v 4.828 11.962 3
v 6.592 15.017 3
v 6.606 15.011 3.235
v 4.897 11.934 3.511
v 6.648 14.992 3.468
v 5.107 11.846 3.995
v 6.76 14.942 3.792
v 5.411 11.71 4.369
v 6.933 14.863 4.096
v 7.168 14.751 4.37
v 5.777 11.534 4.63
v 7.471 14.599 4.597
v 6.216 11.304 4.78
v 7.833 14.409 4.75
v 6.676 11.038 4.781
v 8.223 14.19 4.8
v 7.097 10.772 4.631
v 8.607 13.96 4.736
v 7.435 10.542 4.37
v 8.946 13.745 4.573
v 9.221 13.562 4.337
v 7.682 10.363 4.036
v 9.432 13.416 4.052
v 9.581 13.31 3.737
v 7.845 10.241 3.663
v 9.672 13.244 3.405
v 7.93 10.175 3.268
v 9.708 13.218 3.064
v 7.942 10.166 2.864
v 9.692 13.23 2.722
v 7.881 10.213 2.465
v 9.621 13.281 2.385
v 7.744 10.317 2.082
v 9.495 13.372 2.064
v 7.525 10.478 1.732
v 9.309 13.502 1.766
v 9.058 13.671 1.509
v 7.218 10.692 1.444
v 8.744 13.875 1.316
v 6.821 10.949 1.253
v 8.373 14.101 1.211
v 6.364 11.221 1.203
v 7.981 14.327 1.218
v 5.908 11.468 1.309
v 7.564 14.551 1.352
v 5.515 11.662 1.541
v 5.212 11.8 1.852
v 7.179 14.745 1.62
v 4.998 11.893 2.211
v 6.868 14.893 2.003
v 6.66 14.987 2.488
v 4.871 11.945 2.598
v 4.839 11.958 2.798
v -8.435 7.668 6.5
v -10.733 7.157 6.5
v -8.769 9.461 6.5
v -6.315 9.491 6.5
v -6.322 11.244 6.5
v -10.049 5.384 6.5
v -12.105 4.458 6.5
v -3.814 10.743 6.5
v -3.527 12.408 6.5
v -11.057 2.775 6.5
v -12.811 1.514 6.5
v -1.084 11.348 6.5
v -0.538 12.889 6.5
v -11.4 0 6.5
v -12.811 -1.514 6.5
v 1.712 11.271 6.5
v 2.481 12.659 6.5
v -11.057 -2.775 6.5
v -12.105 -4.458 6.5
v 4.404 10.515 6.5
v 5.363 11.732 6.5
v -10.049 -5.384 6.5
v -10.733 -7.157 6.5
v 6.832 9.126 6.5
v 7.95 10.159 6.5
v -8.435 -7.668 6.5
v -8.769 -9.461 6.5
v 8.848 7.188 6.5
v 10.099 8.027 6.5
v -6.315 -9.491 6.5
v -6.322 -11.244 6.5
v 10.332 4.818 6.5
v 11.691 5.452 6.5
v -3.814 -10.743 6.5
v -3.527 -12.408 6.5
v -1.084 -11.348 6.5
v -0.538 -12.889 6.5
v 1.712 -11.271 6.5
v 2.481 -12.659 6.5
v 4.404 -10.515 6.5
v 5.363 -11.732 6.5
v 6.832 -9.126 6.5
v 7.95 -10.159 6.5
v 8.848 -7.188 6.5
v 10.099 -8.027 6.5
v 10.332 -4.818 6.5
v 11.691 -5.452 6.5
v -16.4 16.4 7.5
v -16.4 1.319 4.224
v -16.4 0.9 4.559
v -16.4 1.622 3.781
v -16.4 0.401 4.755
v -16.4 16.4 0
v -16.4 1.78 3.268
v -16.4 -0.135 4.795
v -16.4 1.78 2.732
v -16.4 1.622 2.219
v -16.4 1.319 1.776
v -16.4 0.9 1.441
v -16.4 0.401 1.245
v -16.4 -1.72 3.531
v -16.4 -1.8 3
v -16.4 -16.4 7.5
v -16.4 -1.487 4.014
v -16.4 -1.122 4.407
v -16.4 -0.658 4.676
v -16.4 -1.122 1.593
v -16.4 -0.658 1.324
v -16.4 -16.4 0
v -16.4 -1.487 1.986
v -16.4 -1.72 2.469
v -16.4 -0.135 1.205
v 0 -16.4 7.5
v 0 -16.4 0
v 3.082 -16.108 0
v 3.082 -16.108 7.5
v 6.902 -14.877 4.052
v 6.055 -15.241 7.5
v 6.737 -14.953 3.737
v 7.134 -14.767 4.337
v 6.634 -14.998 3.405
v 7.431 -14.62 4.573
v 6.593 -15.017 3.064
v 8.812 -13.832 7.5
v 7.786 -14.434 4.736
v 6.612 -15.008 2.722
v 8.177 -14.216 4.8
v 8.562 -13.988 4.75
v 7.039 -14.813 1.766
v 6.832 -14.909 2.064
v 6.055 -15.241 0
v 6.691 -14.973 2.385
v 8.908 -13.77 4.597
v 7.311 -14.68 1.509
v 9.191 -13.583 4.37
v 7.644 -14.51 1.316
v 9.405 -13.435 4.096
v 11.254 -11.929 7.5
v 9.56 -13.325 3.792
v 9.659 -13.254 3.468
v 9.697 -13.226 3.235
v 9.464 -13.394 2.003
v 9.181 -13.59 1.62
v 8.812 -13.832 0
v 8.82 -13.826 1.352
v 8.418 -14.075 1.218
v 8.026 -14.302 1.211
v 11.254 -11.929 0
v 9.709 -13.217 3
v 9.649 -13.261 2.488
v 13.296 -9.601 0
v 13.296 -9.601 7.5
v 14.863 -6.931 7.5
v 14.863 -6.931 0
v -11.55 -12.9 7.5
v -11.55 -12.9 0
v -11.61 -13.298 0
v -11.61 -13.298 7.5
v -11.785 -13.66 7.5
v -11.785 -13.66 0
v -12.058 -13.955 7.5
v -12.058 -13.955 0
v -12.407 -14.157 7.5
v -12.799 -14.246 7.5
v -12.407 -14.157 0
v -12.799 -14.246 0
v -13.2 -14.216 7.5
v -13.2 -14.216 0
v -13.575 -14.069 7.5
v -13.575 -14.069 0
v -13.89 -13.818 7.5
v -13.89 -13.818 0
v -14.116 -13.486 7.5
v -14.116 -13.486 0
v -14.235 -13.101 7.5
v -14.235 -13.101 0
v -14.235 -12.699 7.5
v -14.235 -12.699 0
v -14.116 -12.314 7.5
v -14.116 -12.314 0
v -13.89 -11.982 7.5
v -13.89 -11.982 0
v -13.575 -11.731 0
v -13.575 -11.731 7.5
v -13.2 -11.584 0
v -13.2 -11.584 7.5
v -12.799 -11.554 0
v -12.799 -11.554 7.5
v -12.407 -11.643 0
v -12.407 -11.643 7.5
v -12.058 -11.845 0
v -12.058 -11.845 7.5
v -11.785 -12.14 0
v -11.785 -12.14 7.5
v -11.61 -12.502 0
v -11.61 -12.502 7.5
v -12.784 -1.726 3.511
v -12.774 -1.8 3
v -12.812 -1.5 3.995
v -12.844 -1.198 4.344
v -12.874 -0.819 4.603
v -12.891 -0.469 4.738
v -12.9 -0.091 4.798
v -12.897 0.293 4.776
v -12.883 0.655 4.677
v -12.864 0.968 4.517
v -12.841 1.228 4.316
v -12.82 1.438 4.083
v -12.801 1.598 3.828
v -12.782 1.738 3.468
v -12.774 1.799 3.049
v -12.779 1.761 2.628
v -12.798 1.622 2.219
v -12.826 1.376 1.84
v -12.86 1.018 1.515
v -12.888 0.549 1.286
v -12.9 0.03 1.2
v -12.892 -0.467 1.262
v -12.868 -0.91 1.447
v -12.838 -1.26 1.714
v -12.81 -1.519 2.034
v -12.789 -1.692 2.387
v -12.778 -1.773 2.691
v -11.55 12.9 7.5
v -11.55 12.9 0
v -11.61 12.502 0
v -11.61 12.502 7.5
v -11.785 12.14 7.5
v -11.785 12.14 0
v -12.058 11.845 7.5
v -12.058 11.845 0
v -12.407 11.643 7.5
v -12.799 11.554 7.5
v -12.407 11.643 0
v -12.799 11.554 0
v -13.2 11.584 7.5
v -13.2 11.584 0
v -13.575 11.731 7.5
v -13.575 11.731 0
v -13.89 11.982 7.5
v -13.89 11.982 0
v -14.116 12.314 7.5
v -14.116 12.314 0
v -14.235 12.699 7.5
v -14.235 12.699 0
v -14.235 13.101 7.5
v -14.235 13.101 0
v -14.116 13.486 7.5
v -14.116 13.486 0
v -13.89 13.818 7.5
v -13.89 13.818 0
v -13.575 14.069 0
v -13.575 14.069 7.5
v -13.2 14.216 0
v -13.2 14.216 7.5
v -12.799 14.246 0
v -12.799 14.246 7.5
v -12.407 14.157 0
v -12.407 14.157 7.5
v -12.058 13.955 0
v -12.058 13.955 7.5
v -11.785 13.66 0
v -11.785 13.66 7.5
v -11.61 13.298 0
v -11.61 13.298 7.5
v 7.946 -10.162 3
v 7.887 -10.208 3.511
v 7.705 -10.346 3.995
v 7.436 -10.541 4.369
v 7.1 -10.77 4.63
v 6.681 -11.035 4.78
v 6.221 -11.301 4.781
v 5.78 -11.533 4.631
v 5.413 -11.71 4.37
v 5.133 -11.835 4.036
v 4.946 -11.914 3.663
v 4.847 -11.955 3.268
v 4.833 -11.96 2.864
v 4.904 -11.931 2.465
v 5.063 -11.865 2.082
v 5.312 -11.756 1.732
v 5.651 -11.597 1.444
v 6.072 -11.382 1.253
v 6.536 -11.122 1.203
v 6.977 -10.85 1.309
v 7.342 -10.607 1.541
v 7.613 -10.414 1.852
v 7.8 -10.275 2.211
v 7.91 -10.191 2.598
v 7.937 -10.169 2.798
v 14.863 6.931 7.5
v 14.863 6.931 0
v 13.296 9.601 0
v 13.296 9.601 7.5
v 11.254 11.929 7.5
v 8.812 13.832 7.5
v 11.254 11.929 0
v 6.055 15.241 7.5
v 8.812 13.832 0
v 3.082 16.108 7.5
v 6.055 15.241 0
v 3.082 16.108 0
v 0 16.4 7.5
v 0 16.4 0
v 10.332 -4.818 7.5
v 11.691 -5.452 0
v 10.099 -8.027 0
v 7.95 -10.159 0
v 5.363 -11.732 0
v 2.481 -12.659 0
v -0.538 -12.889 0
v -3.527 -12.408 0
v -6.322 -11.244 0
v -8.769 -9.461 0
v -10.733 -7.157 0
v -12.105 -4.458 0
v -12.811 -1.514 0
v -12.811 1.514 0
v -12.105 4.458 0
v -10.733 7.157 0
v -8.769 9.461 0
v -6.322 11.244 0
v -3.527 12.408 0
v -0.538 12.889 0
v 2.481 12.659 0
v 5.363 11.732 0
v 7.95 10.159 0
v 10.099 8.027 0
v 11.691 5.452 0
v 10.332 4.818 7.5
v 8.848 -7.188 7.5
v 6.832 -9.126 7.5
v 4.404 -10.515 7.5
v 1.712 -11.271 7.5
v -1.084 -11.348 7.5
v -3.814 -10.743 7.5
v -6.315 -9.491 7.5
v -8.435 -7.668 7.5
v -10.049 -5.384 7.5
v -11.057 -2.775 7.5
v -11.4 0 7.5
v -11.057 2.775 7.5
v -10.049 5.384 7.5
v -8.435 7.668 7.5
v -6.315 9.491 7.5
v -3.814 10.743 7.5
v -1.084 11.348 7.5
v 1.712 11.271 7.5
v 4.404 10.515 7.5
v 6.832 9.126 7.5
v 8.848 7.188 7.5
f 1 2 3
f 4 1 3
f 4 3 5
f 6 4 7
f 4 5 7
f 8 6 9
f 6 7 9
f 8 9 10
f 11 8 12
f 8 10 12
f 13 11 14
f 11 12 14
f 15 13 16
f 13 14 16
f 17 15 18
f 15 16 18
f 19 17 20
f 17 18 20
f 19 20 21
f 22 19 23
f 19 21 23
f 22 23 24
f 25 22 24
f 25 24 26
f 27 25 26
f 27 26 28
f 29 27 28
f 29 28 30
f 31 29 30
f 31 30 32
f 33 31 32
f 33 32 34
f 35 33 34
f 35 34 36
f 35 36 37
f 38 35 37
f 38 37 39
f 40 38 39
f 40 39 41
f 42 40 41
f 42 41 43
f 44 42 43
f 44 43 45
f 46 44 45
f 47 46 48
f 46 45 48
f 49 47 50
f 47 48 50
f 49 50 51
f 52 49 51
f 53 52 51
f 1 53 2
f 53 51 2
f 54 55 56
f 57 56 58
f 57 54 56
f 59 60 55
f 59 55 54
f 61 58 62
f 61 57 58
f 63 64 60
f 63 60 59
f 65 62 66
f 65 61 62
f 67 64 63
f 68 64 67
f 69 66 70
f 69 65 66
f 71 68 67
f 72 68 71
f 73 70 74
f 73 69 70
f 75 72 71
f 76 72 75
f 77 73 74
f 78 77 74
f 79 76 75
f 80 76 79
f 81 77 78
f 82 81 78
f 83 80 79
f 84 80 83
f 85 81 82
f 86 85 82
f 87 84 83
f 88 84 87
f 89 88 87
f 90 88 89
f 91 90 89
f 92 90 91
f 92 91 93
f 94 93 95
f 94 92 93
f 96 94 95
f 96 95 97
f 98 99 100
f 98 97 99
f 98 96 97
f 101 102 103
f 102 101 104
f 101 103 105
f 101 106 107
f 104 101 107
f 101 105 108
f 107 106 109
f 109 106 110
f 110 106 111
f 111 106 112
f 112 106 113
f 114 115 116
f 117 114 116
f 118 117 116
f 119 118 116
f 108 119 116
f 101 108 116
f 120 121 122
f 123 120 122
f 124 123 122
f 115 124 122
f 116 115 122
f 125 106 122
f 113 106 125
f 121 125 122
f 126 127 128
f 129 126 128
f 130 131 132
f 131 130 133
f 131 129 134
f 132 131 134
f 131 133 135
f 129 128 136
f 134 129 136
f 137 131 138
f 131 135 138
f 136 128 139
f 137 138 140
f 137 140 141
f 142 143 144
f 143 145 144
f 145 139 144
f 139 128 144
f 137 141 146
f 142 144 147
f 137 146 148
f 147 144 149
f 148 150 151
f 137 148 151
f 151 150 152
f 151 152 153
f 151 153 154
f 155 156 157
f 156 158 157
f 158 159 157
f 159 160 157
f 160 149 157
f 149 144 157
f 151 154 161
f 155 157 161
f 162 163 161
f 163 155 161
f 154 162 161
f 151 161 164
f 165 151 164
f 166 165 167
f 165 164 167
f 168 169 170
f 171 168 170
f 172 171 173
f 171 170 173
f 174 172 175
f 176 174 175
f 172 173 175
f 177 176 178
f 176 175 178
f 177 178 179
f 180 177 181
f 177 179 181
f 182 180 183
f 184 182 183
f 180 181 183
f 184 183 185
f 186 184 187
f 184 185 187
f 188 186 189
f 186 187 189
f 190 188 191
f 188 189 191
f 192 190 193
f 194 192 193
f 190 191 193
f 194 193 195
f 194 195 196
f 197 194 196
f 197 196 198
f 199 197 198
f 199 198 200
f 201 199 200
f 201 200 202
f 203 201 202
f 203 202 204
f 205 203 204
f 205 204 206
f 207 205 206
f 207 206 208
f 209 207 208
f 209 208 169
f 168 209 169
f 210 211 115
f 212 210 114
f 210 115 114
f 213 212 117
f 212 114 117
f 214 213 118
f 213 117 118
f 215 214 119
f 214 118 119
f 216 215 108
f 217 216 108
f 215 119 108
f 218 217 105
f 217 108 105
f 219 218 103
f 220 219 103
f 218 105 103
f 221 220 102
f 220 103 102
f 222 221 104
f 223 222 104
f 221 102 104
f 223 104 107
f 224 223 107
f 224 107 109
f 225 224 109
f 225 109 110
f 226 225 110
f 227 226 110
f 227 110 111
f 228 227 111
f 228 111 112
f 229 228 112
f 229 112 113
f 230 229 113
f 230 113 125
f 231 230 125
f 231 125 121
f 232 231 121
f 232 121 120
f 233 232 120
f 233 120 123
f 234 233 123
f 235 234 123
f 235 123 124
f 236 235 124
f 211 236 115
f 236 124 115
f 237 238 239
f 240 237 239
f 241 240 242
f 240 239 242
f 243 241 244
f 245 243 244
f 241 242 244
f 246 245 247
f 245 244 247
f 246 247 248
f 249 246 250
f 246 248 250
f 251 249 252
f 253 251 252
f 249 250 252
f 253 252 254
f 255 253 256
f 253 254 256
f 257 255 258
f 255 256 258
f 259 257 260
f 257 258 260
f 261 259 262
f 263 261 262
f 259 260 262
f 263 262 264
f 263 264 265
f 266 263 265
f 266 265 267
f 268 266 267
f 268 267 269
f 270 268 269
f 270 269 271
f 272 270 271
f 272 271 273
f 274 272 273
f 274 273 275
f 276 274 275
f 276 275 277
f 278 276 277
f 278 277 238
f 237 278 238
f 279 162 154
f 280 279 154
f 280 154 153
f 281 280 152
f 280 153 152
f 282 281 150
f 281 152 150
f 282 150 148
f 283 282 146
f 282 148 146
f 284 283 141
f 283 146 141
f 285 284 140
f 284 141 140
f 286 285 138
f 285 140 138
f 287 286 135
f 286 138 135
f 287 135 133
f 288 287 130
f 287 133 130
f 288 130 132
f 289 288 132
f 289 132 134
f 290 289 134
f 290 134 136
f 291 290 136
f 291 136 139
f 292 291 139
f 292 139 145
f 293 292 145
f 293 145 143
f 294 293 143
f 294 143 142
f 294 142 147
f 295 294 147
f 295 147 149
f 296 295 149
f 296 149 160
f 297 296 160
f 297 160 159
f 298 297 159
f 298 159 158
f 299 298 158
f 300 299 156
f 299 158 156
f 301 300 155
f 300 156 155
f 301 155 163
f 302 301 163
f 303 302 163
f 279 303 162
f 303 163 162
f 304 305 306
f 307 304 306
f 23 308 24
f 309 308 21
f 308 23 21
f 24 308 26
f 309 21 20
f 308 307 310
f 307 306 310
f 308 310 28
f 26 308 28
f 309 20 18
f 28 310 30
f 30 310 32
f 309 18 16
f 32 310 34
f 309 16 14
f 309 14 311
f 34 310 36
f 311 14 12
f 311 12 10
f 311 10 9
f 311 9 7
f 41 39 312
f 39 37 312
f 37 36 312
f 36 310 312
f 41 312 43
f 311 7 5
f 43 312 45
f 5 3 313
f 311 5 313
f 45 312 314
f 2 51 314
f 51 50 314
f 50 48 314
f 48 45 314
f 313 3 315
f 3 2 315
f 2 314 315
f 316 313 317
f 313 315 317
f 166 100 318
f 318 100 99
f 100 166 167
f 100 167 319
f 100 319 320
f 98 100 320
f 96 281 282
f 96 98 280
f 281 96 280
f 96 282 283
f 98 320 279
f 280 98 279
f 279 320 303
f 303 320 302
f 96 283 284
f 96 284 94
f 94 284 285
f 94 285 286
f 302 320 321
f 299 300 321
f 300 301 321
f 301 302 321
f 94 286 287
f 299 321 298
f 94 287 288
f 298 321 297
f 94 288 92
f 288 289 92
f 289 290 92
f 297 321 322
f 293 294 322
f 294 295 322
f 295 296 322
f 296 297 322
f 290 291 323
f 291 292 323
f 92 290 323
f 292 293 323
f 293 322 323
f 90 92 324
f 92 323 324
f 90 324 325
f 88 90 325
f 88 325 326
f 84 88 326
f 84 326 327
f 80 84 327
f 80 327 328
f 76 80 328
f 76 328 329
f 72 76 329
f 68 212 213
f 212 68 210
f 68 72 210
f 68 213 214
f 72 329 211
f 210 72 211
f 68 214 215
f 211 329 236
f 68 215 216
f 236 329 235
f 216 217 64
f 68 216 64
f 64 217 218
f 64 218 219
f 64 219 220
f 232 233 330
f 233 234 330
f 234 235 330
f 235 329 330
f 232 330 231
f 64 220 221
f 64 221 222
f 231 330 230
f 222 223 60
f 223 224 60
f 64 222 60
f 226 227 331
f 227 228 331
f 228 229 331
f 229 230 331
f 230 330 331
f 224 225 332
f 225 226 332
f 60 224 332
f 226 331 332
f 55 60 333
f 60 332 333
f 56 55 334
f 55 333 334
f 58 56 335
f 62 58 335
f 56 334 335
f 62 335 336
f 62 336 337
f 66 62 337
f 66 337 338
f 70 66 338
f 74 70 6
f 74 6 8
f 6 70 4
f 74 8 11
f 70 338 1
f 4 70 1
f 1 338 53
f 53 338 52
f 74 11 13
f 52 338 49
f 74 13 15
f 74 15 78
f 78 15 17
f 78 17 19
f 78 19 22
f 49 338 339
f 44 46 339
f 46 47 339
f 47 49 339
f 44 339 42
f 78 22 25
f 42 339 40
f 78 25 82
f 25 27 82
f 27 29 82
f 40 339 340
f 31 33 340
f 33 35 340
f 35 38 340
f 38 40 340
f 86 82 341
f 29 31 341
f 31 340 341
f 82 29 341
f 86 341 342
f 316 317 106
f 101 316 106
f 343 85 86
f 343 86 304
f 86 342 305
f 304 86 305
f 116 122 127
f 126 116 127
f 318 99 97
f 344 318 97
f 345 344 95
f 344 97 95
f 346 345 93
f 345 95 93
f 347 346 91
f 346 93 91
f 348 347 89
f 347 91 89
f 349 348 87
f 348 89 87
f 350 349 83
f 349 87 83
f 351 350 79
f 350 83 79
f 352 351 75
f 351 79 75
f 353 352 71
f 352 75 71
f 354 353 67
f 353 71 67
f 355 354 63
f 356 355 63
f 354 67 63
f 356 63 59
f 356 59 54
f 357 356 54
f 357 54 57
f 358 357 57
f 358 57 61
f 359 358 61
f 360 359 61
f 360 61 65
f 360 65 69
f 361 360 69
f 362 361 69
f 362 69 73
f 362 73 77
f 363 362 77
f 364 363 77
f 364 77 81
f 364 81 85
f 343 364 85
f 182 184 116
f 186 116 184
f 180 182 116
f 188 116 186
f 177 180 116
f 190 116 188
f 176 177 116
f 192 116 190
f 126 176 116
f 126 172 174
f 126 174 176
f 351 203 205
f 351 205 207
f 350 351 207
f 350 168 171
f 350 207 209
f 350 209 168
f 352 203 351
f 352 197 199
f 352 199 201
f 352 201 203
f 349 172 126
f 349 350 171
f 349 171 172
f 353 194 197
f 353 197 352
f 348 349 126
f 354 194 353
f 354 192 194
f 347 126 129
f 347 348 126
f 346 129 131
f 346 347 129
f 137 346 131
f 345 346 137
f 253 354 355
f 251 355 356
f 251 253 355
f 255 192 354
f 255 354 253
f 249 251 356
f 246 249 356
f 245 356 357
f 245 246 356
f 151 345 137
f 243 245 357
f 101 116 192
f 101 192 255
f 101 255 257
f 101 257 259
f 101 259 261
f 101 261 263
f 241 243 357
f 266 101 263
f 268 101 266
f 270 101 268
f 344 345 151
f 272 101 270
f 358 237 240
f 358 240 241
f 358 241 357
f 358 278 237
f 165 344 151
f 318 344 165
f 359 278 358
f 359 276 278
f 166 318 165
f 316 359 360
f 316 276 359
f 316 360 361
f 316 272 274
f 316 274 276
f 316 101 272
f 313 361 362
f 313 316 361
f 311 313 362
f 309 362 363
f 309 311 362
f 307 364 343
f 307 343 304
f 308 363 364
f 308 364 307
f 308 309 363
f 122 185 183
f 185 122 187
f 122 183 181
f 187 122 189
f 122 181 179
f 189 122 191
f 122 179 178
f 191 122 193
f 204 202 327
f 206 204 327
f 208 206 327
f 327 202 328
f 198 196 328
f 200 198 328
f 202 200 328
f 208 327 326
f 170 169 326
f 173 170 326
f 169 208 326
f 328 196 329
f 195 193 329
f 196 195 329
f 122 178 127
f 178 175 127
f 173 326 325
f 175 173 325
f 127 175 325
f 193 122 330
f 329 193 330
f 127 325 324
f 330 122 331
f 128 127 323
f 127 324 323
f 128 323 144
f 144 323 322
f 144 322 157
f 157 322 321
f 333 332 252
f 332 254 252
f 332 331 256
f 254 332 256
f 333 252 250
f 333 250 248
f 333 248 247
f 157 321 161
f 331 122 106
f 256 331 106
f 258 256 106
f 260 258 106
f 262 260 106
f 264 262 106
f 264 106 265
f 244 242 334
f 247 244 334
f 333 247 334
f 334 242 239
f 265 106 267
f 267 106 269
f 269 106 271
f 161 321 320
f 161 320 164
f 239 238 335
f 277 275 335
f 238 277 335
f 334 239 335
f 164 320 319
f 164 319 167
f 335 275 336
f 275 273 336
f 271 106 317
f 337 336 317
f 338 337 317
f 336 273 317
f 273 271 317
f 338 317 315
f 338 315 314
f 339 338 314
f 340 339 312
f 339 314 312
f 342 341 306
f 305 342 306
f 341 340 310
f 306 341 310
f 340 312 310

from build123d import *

# Parameters (mm, degrees)
F1_DEPTH  = 7.5
F2_R      = 12.9
F3_DEPTH  = 6.5
F7_R      = 1.8
F8_DEPTH  = 10
F9_R      = 1.8
F10_DEPTH = 10
F11_R     = 1.8
F12_DEPTH = 10
F13_R     = 1.35
F14_DEPTH = 7.501


with BuildPart() as f1:
    # F0 (on Top) → F1 (new body)
    with BuildSketch(Plane.XY):
        with BuildLine():
            ThreePointArc((10.331909, -4.817848), (-11.4, 0), (10.331909, 4.817848))
            Line((10.331909, 4.817848), (14.863448, 6.930939))
            ThreePointArc((14.863448, 6.930939), (8.811714, 13.83162), (0, 16.4))
            Line((0, 16.4), (-16.4, 16.4))
            Line((-16.4, 16.4), (-16.4, -16.4))
            Line((-16.4, -16.4), (0, -16.4))
            ThreePointArc((0, -16.4), (8.811714, -13.83162), (14.863448, -6.930939))
            Line((14.863448, -6.930939), (10.331909, -4.817848))
        make_face()
    extrude(amount=F1_DEPTH)

    # F2 (on face) → F3 (cut)
    with BuildSketch(Plane(origin=(0, 0, 0), x_dir=(1, 0, 0), z_dir=(0, 0, -1))):
        Circle(F2_R)
    extrude(amount=-F3_DEPTH, mode=Mode.SUBTRACT)

    # F7 (on face) → F8 (cut)
    with BuildSketch(Plane(origin=(8.2, 14.202817, 0), x_dir=(-0.866025, 0.5, 0), z_dir=(0.5, 0.866025, 0))):
        with Locations((0, 3)):
            Circle(F7_R)
    extrude(amount=-F8_DEPTH, mode=Mode.SUBTRACT)

    # F9 (on face) → F10 (cut)
    with BuildSketch(Plane(origin=(-16.4, 0, 0), x_dir=(0, -1, 0), z_dir=(-1, 0, 0))):
        with Locations((0, 3)):
            Circle(F9_R)
    extrude(amount=-F10_DEPTH, mode=Mode.SUBTRACT)

    # F11 (on face) → F12 (cut)
    with BuildSketch(Plane(origin=(8.2, -14.202817, 0), x_dir=(0.866025, 0.5, 0), z_dir=(0.5, -0.866025, 0))):
        with Locations((0, 3)):
            Circle(F11_R)
    extrude(amount=-F12_DEPTH, mode=Mode.SUBTRACT)

    # F13 (on face) → F14 (cut, through all)
    with BuildSketch(Plane(origin=(0, 0, 0), x_dir=(1, 0, 0), z_dir=(0, 0, -1))):
        with Locations((-12.9, -12.9)):
            Circle(F13_R)
        with Locations((-12.9, 12.9)):
            Circle(F13_R)
    extrude(amount=-F14_DEPTH, mode=Mode.SUBTRACT)


solid = f1.part
